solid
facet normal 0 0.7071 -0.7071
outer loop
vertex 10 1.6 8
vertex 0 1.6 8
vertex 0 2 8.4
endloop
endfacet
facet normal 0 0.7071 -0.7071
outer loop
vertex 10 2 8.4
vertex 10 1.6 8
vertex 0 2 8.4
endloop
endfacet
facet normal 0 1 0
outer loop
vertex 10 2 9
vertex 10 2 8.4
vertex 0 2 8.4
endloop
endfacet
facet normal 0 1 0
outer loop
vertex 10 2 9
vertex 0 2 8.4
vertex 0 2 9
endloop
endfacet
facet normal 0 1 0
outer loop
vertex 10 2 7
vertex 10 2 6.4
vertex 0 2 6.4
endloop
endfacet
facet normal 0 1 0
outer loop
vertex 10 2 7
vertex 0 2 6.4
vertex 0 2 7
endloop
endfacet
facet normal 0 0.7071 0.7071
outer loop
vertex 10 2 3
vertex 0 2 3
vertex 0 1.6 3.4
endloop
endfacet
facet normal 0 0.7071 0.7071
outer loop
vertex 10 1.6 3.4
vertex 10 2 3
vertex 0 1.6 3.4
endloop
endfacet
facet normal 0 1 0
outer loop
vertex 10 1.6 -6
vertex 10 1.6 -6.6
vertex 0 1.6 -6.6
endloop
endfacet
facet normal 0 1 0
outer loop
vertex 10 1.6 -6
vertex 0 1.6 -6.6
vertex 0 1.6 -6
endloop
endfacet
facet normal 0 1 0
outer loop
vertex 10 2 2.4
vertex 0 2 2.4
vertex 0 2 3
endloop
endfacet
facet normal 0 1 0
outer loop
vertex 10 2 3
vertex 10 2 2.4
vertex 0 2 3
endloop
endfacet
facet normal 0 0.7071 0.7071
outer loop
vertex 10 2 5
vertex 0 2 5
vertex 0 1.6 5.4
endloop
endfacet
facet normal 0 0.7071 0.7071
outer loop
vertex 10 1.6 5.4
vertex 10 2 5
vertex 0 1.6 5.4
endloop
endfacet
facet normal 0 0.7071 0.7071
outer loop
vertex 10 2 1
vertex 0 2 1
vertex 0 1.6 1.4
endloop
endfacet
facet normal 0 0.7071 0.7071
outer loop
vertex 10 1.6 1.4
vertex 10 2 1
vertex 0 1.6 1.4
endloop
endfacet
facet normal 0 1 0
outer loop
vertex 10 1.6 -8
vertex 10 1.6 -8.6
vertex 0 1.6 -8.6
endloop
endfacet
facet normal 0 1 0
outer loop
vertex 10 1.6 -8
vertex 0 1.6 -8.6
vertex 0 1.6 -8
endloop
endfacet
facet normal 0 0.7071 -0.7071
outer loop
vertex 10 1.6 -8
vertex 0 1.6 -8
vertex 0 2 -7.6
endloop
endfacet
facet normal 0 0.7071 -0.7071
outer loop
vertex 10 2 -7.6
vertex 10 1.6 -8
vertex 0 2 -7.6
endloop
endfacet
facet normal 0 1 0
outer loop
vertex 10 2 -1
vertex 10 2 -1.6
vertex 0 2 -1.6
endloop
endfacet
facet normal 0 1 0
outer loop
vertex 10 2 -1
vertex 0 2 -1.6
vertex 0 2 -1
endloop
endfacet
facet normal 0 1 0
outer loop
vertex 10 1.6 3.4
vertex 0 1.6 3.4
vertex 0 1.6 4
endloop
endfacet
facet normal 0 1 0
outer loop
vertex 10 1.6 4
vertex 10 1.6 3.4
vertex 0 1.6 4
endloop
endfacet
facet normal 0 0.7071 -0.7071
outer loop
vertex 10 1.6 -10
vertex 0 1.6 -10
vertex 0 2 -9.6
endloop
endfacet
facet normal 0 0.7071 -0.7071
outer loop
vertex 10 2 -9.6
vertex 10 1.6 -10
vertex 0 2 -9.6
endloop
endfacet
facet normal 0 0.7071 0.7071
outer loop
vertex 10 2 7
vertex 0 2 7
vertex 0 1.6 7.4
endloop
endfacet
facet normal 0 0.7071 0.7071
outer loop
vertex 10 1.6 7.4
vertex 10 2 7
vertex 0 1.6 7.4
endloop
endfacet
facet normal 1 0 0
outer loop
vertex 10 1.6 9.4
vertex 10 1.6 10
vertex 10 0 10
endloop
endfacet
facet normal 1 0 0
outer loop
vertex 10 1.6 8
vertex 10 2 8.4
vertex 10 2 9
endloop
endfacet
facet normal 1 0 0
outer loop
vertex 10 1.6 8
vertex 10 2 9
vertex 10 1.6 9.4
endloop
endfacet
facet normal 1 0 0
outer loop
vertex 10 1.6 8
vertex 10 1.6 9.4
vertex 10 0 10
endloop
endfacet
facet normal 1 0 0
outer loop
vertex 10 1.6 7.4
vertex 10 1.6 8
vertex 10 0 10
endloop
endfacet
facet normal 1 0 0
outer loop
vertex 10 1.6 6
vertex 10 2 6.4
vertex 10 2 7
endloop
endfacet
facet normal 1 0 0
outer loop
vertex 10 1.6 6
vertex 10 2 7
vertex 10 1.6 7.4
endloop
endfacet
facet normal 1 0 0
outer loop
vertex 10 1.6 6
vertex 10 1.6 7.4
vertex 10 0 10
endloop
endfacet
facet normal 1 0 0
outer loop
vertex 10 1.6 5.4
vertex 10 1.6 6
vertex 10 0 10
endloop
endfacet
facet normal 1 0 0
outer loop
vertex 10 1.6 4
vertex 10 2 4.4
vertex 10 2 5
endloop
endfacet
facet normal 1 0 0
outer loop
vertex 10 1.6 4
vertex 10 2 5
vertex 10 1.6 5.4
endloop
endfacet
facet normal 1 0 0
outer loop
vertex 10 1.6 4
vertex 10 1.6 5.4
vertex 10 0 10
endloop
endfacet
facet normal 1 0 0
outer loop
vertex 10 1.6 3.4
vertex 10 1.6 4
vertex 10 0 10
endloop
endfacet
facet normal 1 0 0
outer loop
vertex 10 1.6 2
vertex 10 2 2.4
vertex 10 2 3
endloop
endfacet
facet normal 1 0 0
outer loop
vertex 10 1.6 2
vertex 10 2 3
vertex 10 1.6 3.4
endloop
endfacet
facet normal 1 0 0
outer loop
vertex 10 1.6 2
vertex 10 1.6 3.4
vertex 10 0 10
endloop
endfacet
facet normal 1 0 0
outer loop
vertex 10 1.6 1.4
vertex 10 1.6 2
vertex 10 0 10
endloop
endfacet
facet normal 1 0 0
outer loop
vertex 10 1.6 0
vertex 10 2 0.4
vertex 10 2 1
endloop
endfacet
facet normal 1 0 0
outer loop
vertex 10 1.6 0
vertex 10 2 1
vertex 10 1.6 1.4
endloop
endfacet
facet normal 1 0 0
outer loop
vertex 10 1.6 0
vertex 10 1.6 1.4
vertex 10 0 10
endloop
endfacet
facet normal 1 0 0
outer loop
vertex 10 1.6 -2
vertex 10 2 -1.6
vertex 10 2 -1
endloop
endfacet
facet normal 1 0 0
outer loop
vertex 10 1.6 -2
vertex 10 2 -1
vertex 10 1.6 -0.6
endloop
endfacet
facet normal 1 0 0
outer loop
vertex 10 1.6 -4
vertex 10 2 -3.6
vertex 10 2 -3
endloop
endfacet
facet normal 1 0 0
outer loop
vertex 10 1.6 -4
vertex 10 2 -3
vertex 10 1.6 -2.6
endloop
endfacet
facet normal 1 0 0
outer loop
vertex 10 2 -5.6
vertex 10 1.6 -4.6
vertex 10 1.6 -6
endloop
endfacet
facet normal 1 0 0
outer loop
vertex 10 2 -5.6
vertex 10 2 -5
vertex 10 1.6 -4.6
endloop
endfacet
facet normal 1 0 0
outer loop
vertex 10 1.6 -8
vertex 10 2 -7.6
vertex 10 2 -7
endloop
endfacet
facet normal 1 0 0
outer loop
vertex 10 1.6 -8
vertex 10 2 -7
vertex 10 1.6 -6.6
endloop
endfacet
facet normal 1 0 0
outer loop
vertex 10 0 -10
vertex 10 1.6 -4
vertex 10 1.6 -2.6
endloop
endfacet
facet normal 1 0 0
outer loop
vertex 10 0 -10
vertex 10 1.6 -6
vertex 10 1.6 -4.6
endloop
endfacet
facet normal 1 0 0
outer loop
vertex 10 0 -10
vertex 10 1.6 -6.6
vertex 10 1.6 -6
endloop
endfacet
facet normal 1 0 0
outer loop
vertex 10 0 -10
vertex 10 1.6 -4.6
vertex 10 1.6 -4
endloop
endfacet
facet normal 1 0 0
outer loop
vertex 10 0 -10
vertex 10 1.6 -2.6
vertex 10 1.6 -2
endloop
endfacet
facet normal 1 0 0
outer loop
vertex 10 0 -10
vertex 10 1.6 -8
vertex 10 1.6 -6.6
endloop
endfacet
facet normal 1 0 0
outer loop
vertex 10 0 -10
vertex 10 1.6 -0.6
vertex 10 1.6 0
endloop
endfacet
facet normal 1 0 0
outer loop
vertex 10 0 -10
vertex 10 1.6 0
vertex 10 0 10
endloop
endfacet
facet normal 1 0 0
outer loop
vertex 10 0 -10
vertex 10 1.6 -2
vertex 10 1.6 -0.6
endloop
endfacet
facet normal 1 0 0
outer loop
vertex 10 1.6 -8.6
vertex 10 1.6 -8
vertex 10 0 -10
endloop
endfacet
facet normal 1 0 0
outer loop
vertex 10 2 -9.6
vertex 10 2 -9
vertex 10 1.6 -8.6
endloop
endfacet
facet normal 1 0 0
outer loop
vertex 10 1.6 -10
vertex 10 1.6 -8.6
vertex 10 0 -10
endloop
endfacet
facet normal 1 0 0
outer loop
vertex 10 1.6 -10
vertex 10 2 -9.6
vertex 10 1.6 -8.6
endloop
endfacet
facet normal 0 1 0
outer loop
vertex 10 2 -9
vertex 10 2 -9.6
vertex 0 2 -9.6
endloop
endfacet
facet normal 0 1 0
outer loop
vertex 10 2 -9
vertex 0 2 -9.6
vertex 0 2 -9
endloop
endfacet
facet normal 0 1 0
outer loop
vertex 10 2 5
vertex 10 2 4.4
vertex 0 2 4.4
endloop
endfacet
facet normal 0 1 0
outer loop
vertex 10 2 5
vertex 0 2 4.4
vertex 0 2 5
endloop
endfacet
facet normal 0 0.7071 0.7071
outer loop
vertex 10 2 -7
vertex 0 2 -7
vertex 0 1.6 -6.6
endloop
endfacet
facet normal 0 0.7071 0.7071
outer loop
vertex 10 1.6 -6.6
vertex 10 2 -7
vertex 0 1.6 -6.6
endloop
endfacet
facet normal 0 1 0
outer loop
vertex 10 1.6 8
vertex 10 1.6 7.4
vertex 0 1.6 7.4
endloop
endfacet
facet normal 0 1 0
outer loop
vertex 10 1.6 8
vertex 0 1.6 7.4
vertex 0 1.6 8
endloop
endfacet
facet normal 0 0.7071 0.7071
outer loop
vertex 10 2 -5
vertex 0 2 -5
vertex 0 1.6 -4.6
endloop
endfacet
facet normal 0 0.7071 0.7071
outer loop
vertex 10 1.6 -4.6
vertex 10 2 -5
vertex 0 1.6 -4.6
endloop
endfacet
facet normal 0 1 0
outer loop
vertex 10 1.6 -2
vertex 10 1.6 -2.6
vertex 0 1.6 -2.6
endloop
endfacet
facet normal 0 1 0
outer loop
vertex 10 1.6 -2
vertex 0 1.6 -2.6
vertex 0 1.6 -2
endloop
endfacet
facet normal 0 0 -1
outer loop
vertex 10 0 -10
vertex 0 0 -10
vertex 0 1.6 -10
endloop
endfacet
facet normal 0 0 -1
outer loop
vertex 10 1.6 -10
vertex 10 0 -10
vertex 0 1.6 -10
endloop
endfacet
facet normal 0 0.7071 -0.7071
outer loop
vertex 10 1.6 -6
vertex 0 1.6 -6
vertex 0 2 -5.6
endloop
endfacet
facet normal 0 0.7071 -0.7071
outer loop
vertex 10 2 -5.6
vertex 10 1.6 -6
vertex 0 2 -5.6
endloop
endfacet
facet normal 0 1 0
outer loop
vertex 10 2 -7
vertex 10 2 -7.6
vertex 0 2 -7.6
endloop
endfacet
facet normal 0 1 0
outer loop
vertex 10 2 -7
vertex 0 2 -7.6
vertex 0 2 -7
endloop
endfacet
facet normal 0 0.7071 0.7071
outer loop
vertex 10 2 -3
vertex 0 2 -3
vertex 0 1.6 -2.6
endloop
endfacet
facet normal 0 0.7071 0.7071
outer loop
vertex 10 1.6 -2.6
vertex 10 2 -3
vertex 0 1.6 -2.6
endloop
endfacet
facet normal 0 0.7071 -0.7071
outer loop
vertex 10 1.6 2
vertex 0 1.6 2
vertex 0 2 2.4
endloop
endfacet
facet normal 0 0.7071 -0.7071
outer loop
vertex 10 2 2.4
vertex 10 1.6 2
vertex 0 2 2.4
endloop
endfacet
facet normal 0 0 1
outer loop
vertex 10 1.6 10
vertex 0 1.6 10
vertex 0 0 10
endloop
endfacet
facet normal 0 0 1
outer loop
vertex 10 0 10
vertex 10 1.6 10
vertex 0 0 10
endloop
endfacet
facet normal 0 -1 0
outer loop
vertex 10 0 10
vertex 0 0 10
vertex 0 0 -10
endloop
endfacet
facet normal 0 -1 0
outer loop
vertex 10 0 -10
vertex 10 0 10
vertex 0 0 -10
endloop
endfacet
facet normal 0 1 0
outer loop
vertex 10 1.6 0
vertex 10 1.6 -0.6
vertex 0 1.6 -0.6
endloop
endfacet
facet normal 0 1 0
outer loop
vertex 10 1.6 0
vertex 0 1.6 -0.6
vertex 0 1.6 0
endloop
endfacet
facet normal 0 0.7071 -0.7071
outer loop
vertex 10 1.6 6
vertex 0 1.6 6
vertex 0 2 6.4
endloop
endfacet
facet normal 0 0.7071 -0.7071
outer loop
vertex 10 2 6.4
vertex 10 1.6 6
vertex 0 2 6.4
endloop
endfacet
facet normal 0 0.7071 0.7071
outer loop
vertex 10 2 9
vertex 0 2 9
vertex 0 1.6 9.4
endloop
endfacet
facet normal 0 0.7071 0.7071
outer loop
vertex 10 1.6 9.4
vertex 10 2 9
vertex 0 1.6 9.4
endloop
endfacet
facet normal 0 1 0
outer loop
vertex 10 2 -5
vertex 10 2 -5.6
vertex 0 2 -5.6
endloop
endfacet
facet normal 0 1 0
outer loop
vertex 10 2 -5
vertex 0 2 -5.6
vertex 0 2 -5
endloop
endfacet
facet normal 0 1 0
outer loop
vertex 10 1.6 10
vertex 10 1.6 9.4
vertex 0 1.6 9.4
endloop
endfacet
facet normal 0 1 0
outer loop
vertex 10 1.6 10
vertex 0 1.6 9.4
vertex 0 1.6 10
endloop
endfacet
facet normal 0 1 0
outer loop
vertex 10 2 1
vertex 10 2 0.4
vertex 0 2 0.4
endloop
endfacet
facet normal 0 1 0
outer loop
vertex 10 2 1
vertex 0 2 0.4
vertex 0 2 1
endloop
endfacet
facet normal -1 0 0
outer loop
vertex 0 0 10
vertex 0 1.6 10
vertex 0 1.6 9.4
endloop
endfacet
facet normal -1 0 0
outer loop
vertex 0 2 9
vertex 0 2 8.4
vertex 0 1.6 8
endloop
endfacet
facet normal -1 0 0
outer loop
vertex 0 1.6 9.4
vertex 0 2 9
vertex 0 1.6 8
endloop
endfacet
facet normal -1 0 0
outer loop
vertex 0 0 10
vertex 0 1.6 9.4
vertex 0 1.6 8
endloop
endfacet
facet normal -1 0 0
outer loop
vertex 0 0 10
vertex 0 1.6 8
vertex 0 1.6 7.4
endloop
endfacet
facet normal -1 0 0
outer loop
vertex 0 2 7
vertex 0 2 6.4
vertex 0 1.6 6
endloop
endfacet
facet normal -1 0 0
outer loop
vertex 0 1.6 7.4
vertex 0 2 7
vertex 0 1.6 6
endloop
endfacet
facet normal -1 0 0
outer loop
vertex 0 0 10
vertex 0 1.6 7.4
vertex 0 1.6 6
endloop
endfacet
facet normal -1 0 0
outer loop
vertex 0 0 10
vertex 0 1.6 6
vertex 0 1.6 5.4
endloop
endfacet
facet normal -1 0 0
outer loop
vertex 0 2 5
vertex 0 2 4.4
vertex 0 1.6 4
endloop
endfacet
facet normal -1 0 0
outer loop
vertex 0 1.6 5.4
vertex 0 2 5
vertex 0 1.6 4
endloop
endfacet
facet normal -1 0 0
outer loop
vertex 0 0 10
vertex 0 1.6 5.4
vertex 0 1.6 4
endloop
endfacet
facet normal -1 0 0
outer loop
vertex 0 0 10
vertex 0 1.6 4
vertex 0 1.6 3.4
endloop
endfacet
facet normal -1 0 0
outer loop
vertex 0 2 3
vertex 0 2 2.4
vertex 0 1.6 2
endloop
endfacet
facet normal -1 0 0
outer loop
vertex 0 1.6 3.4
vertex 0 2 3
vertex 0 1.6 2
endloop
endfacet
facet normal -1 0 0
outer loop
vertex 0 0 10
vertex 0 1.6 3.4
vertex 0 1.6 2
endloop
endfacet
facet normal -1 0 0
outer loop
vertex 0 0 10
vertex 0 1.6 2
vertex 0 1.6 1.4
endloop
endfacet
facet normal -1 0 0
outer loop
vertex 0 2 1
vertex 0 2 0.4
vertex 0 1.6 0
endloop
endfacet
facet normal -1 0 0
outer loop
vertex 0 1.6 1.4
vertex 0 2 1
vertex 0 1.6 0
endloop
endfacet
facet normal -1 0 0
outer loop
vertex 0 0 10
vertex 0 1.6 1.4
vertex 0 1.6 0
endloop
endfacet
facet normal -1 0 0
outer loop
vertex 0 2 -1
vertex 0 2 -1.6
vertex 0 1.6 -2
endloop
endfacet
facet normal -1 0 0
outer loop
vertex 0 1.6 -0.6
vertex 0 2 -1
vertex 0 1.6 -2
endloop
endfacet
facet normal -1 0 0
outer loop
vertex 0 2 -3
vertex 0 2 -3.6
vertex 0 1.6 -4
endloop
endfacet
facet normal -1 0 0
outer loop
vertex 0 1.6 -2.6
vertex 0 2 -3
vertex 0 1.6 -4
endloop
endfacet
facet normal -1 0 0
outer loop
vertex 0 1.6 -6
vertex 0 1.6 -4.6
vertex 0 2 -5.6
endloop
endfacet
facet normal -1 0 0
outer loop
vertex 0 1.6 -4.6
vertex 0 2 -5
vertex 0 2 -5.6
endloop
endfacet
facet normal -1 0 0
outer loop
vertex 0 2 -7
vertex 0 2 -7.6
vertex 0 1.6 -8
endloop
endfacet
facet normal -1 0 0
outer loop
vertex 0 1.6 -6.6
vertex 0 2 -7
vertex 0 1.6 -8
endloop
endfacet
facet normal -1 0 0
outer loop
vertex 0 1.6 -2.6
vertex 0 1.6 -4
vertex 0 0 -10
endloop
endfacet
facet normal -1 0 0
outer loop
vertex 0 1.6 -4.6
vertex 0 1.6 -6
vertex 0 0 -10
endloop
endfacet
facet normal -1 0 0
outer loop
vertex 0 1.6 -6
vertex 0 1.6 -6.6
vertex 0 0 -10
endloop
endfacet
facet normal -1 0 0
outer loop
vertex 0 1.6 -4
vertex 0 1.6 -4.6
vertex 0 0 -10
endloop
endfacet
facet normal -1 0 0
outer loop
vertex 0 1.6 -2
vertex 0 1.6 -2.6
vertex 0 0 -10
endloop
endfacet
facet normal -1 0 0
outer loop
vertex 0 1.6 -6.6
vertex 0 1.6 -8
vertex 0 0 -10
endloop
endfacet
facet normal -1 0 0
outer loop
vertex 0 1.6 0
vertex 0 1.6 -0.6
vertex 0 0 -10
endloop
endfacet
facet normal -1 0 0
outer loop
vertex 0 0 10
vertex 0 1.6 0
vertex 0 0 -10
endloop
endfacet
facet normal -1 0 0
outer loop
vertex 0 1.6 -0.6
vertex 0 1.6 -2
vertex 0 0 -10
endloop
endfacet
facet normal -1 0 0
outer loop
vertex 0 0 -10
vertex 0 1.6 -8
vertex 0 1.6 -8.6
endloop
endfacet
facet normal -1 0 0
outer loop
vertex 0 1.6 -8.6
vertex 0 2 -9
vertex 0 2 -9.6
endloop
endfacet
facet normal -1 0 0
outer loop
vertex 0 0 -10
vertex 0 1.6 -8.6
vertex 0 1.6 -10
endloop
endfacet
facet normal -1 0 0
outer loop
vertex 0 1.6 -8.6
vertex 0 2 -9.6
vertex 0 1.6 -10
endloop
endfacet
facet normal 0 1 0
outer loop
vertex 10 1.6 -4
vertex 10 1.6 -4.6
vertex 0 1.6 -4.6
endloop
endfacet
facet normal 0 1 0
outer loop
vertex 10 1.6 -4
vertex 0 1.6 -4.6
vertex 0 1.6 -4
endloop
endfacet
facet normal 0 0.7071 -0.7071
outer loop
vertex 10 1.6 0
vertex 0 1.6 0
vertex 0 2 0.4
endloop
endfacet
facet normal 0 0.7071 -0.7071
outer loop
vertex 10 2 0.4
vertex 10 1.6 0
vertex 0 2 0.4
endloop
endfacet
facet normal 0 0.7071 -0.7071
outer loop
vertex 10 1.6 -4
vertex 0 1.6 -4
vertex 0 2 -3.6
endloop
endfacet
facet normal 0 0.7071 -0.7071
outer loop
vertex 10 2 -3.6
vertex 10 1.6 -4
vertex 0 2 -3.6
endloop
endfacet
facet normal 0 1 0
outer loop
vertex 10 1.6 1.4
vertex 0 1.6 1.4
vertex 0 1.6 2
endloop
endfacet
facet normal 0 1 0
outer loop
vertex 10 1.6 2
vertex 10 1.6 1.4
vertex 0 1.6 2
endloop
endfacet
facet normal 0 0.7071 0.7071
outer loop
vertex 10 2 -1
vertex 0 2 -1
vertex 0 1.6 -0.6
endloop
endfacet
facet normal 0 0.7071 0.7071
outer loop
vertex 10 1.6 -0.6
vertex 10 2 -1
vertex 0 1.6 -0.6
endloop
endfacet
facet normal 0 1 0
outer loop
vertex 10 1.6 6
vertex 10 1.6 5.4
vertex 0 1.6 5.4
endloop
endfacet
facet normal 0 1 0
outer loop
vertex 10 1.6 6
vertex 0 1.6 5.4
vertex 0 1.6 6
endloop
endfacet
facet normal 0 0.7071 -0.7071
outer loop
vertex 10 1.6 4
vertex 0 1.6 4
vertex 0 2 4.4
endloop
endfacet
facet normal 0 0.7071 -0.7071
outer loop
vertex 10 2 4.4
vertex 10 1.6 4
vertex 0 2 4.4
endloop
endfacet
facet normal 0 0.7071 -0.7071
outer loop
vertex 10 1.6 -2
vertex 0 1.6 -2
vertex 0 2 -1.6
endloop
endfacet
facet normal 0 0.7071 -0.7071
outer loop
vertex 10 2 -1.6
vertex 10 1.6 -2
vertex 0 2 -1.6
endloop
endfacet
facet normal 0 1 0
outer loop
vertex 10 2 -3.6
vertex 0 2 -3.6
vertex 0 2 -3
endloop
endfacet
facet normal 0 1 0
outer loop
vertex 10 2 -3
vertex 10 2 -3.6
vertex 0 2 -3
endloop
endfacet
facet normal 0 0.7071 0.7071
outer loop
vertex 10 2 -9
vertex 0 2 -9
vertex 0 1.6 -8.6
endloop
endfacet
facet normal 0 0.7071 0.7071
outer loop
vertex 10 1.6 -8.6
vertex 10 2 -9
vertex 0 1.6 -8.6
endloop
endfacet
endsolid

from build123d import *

# Parameters (mm, degrees)
EXTRUDE_1_DEPTH = 10


with BuildPart() as part:
    # 草图2 → 凸台-拉伸1 (new body)
    with BuildSketch(Plane(origin=(0, 0, 0), x_dir=(0, 0, -1), z_dir=(1, 0, 0))):
        Polygon((-10, 0), (10, 0), (10, 1.6), (9.6, 2), (9, 2), (8.6, 1.6), (8, 1.6), (7.6, 2), (7, 2), (6.6, 1.6), (6, 1.6), (5.6, 2), (5, 2), (4.6, 1.6), (4, 1.6), (3.6, 2), (3, 2), (2.6, 1.6), (2, 1.6), (1.6, 2), (1, 2), (0.6, 1.6), (0, 1.6), (-0.4, 2), (-1, 2), (-1.4, 1.6), (-2, 1.6), (-2.4, 2), (-3, 2), (-3.4, 1.6), (-4, 1.6), (-4.4, 2), (-5, 2), (-5.4, 1.6), (-6, 1.6), (-6.4, 2), (-7, 2), (-7.4, 1.6), (-8, 1.6), (-8.4, 2), (-9, 2), (-9.4, 1.6), (-10, 1.6), align=None)
    extrude(amount=EXTRUDE_1_DEPTH)


solid = part.part
